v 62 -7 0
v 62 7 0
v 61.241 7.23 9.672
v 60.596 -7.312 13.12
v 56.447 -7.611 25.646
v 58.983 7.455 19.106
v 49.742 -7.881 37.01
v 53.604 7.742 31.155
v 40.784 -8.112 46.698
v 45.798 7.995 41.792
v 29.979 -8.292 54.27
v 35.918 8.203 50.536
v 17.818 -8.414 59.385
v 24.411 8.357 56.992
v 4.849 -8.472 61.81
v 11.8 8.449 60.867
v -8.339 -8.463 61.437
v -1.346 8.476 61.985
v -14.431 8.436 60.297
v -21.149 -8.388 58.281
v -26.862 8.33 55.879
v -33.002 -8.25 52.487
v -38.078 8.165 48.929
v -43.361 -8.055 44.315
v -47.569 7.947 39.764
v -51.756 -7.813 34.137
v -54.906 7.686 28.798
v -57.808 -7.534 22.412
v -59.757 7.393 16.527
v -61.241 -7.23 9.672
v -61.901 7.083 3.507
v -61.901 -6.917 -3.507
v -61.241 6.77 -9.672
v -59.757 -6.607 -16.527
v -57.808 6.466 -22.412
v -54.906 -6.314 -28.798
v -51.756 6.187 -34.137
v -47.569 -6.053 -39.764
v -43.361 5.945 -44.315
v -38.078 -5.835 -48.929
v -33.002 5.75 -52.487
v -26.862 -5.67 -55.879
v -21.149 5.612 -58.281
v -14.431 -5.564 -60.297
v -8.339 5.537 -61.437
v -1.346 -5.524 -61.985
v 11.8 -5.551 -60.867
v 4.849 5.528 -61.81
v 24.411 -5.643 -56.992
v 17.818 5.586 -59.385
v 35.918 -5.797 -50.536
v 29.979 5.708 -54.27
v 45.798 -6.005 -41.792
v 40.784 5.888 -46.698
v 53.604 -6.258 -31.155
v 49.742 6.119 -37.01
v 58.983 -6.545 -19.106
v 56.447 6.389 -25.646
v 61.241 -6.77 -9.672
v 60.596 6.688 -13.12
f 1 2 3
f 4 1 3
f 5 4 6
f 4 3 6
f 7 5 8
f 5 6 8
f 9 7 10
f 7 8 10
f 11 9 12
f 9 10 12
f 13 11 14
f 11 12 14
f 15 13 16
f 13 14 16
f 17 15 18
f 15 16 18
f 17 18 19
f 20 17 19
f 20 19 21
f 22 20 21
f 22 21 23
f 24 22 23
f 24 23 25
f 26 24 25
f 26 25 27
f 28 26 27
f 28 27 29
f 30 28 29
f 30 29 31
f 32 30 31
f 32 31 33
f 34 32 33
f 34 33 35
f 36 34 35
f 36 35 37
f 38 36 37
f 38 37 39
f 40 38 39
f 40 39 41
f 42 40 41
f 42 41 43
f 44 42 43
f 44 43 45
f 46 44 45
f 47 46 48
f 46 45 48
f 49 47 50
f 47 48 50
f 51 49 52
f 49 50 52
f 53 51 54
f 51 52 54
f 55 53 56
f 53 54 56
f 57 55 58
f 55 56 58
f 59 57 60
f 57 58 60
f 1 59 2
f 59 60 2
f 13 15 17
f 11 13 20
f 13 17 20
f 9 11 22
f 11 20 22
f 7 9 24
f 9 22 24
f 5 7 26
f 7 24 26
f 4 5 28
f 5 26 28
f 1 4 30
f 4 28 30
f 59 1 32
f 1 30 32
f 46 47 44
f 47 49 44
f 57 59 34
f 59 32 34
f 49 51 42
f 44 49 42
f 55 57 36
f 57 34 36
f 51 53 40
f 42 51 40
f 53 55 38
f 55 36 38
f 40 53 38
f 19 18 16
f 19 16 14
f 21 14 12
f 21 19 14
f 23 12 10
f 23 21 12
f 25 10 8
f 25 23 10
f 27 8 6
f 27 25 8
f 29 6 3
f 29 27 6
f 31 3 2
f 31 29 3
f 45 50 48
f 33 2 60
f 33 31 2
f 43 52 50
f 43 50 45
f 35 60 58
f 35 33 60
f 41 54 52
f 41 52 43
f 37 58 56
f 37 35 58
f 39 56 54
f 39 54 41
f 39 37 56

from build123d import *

# Parameters (mm, degrees)
CYLINDER001_R     = 62
CYLINDER001_DEPTH = 24
PAD004_DEPTH      = 128


with BuildPart() as cylinder001:
    # Cylinder001 → Cylinder001 (new body)
    with BuildSketch(Plane.XZ.offset(-12)):
        Circle(CYLINDER001_R)
    extrude(amount=CYLINDER001_DEPTH)


with BuildPart() as body004:
    # Sketch004 → Pad004 (new body)
    with BuildSketch(Plane.YZ):
        Polygon((0, 0), (12, 0), (5, -294), (0, -294), align=None)
    extrude(amount=PAD004_DEPTH)


with BuildPart() as body004_1:
    # Body004 placement: moved
    add(body004.part.moved(Location((0, 0, 210))))


with BuildPart() as gate_ba:
    # Part__Mirroring007: instance of Body004
    add(body004_1.part.mirror(Plane(origin=(0, 0, 0), x_dir=(1, 0, 0), z_dir=(0, 1, 0))))

    # Fusion015: union Body004
    add(body004_1.part)


with BuildPart() as gate_ba_1:
    # Fusion015 placement: moved
    add(gate_ba.part.moved(Location((-64, 0, 0))))

    # Common001: intersect Cylinder001
    add(cylinder001.part, mode=Mode.INTERSECT)


solid = gate_ba_1.part
